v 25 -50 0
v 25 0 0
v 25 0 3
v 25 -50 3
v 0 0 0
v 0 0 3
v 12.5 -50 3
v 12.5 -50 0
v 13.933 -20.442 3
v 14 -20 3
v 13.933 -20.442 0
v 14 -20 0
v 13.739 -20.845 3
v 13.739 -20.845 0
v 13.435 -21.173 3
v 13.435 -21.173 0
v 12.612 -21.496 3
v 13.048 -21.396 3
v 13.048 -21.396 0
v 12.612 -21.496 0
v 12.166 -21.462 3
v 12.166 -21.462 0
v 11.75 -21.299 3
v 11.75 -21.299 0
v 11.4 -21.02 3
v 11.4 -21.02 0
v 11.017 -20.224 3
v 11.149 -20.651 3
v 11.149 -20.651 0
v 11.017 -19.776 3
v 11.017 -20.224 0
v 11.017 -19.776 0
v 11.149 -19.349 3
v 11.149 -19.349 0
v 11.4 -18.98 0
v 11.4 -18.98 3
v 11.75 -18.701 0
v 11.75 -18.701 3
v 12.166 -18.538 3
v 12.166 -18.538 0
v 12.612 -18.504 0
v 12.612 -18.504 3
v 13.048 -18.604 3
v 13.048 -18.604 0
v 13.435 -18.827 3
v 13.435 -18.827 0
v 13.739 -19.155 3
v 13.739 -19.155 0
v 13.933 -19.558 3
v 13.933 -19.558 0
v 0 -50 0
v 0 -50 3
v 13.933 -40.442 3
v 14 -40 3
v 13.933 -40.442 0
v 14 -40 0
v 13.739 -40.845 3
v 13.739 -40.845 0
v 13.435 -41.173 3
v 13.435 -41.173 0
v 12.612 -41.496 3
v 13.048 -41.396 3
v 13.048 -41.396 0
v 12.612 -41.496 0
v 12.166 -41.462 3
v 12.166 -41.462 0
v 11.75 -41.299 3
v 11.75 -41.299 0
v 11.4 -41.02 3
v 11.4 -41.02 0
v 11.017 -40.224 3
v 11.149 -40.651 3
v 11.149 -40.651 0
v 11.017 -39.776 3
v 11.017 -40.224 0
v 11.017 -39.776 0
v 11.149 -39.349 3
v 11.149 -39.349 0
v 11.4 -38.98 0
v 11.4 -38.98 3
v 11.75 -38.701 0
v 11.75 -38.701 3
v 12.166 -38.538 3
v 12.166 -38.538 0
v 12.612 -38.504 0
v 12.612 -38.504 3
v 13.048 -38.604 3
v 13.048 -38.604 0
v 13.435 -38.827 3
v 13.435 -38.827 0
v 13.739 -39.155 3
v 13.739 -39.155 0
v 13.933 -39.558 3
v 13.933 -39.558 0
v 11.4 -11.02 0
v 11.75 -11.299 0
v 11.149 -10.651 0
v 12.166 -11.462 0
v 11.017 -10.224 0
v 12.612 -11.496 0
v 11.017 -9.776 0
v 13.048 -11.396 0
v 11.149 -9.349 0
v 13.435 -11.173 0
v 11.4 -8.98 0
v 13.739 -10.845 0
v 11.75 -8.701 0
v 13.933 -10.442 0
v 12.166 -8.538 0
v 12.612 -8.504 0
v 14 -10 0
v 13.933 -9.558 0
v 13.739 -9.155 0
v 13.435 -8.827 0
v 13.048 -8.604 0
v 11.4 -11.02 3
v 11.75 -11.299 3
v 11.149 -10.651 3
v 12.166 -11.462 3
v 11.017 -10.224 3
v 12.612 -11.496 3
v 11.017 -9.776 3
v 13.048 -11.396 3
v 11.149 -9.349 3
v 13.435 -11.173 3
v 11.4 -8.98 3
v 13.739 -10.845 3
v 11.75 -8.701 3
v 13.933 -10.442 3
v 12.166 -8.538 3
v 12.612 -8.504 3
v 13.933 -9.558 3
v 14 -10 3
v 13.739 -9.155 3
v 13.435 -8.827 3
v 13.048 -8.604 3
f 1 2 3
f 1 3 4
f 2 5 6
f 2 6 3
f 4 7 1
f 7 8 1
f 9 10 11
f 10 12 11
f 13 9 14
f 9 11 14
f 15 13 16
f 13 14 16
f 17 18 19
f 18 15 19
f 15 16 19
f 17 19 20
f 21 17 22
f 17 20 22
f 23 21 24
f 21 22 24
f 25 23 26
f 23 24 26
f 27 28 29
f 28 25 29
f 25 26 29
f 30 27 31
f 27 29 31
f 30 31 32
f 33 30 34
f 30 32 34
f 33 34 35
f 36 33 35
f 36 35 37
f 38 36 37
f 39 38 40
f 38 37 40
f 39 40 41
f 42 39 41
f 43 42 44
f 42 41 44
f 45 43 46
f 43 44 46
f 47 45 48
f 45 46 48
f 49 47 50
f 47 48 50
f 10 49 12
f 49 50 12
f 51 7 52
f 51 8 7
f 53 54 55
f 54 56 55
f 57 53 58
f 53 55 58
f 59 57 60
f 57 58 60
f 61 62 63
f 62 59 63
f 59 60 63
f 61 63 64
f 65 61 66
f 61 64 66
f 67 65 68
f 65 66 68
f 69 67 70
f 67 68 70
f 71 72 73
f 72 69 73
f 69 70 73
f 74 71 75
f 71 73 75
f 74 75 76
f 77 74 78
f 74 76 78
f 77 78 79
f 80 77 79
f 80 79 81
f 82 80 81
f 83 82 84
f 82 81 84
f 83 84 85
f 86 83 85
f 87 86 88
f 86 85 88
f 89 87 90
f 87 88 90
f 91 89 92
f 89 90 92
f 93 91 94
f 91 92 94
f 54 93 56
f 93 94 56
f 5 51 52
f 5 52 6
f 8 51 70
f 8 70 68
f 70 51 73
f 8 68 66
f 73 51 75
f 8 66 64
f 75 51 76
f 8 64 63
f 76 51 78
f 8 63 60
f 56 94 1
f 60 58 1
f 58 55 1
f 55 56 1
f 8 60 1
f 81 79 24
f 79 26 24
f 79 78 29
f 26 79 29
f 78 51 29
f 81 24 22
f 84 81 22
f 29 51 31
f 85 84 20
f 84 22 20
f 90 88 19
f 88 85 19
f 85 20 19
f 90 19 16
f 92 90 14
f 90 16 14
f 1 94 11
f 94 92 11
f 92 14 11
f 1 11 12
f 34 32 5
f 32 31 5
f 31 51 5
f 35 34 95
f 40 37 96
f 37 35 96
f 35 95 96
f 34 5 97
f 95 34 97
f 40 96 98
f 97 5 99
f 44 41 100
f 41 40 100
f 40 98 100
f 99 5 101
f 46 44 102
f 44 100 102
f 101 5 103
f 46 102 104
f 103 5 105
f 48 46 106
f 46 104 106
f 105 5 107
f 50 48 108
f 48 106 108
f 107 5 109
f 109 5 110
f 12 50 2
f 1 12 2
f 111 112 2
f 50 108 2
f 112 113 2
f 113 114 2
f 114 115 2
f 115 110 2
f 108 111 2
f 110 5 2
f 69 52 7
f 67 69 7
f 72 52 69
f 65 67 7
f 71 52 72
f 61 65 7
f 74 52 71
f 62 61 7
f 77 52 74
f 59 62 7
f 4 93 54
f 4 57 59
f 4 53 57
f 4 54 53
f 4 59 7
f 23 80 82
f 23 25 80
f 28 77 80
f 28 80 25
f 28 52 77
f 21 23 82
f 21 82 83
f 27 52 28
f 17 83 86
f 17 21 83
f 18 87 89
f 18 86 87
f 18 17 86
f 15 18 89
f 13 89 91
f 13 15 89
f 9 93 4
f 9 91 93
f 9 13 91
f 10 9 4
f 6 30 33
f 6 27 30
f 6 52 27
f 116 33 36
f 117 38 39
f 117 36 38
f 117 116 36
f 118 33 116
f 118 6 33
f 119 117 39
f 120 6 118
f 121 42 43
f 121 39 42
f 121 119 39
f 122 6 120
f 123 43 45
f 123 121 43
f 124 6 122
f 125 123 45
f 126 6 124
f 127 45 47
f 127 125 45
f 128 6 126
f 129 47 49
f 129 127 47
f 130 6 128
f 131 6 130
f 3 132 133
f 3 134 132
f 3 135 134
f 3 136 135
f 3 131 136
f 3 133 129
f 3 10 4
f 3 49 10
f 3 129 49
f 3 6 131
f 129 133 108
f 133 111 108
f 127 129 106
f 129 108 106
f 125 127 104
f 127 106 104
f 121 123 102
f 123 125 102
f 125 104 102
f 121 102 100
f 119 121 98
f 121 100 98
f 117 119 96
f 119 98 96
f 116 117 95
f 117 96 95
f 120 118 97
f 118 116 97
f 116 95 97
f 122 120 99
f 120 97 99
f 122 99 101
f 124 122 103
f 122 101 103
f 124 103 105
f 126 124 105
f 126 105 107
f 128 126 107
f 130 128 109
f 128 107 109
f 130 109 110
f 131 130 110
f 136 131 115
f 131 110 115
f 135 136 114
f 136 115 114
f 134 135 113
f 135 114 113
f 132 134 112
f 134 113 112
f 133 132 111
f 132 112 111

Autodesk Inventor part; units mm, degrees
ref_plane "YZ Plane" through (0, 0, 0) normal (1, 0, 0) x (0, 1, 0)
ref_plane "XZ Plane" through (0, 0, 0) normal (0, 1, 0) x (-1, 0, 0)
ref_plane "XY Plane" through (0, 0, 0) normal (0, 0, 1) x (1, 0, 0)
sketch "Sketch1" plane through (0, 0, 0) normal (0, 0, 1) x (1, 0, 0)
  line L0 (0, 0) -> (25, 0)
  line L1 (25, 0) -> (25, -50)
  line L2 (0, -50) -> (0, 0)
  circle A0 centre (12.5, -40) radius 1.5
  circle A1 centre (12.5, -20) radius 1.5
  circle A2 centre (12.5, -10) radius 1.5
  line L3 (12.5, -50) -> (0, -50)
  line L4 (12.5, -50) -> (25, -50)
  dimension "d6" = 3
  dimension "d7" = 3
extrude "Extrusion1" add sketch "Sketch1" along normal blind 3
properties part number "plat sim"
